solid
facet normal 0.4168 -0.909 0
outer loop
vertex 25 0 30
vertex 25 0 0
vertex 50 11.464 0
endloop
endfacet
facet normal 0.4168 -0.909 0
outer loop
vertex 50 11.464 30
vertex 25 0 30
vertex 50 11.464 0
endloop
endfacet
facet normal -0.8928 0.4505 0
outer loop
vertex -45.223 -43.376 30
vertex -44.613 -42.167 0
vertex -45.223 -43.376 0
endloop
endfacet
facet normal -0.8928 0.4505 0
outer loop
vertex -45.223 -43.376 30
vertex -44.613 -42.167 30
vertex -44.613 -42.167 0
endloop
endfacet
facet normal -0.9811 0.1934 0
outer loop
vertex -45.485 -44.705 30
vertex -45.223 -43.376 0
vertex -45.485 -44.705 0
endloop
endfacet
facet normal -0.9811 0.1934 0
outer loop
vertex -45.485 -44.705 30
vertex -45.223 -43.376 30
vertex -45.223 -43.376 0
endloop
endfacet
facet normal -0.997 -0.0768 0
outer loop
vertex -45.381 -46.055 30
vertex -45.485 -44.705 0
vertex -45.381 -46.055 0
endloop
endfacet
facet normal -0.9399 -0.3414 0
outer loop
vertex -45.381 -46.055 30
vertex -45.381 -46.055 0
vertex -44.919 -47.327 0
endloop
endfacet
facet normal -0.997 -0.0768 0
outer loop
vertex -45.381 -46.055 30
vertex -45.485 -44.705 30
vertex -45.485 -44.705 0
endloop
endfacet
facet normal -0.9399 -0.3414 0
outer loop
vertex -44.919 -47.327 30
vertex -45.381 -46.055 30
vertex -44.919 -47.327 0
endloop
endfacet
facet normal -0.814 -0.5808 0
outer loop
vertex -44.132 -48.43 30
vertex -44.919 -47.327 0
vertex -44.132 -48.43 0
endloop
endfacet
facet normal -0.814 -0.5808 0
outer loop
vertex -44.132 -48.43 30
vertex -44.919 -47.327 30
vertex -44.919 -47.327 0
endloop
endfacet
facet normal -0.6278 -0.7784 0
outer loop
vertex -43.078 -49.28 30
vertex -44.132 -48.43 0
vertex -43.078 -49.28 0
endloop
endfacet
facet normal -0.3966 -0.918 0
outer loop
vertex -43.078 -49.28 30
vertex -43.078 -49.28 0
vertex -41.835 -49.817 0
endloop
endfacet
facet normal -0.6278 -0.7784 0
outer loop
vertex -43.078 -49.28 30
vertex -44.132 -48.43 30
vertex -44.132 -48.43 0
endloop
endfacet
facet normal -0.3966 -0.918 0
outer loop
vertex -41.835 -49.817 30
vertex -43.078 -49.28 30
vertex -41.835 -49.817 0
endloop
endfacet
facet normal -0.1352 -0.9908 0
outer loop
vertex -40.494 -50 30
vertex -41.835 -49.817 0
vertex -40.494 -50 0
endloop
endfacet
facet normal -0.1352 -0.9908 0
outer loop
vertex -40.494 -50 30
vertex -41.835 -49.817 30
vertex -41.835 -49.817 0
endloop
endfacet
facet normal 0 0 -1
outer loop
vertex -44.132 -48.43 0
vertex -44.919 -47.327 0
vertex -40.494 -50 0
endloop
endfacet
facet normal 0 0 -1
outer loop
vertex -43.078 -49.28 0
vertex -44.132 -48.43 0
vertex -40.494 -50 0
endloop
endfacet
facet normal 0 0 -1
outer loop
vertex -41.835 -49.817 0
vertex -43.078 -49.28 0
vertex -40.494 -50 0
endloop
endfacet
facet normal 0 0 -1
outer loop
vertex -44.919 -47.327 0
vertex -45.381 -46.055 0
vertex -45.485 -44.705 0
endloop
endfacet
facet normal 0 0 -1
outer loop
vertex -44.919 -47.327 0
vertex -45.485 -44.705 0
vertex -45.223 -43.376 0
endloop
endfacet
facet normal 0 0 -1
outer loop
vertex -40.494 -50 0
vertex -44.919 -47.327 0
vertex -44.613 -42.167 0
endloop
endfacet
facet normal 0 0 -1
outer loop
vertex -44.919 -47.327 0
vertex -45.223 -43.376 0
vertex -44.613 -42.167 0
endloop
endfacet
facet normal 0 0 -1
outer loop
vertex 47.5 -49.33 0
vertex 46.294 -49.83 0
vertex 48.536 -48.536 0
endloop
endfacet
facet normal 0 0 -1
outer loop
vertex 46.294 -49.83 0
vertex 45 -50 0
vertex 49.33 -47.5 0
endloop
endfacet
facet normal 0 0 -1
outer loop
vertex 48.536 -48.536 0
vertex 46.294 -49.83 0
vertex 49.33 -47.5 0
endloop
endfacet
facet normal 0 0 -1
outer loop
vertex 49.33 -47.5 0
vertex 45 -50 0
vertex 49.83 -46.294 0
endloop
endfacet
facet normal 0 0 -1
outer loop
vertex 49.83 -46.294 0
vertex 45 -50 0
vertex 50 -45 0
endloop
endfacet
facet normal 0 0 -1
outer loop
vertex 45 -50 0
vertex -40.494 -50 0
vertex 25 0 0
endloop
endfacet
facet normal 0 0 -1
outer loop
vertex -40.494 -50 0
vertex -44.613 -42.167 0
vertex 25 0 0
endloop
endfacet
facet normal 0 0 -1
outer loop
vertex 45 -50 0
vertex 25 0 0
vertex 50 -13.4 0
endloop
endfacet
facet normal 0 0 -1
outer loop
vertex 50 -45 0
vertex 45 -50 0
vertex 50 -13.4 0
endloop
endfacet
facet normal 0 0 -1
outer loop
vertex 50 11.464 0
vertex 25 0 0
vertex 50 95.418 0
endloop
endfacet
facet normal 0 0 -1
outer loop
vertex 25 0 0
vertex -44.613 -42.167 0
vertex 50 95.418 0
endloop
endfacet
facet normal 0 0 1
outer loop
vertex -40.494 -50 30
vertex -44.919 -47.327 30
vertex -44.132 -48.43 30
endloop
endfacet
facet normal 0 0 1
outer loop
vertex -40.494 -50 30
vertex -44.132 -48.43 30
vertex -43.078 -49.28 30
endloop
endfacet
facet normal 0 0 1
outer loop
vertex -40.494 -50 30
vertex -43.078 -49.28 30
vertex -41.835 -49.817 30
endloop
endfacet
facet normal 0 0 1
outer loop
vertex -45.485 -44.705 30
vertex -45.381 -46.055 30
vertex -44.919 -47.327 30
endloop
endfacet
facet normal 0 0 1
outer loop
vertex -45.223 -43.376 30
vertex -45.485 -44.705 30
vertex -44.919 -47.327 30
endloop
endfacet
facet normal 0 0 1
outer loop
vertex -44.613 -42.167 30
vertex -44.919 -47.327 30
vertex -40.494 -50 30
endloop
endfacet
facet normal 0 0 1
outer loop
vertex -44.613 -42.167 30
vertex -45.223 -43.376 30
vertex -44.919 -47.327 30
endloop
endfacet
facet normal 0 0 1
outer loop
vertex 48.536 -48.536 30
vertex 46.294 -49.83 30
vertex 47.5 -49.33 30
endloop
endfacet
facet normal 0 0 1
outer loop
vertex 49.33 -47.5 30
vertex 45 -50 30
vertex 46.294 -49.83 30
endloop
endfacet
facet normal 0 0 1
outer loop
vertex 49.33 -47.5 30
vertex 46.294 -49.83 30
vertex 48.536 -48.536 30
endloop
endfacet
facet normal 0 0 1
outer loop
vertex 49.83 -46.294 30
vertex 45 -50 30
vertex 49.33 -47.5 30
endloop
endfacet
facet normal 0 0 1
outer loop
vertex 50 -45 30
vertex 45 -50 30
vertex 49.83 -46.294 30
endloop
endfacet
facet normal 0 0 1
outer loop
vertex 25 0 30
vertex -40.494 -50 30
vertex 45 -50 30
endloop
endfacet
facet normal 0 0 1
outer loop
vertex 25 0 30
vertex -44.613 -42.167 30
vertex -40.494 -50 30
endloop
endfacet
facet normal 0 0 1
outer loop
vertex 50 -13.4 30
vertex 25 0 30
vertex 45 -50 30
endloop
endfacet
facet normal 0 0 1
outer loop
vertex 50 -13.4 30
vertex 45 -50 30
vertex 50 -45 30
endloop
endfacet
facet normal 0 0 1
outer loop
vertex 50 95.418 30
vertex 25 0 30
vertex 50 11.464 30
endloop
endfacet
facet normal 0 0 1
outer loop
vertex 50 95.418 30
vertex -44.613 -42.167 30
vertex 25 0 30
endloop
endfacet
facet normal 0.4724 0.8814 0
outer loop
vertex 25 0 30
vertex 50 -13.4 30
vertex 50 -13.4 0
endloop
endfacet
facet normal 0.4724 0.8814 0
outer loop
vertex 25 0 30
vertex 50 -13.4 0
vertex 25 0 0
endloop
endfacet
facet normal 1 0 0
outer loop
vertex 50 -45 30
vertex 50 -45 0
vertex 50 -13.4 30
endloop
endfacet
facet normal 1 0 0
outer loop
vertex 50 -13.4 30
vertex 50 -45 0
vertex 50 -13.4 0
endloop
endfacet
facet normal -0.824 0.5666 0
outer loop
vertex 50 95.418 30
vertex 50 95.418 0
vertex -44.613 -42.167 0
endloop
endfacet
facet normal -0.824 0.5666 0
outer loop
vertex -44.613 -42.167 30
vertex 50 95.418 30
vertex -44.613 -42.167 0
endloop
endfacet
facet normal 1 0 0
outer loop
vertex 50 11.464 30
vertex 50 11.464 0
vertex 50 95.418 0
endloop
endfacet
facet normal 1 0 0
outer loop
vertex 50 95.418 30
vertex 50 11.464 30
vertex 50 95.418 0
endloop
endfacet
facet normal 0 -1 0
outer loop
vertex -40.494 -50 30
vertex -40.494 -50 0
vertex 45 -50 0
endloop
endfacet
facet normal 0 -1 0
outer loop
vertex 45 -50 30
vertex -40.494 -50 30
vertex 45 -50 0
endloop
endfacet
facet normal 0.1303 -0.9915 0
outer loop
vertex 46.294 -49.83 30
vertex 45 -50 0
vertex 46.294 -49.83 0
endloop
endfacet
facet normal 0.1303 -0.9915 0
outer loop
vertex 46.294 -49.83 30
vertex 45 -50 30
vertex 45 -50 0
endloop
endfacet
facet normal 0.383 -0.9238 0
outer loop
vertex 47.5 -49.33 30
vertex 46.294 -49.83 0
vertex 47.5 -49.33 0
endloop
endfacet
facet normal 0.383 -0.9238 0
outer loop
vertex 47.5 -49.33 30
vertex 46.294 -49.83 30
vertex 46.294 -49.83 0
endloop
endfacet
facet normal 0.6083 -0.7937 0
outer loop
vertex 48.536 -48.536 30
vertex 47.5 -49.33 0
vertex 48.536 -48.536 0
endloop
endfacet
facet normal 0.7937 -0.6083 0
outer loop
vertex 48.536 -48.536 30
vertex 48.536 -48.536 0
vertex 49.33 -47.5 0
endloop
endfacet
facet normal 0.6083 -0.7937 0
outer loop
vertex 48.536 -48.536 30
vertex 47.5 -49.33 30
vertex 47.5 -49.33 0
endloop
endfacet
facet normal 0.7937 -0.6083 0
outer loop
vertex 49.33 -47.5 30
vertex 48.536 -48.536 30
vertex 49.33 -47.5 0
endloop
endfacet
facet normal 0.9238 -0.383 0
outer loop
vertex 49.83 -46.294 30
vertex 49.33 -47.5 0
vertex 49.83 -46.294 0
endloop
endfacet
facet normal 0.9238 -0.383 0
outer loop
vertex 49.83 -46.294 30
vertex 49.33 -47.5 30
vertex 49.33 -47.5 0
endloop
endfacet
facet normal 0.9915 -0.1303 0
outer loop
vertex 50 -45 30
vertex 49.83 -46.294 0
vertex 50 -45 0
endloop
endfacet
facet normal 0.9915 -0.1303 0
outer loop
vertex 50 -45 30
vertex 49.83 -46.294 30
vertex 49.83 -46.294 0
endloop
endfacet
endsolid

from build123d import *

# Parameters (mm, degrees)
F1_DEPTH = 30
F2_R     = 5


with BuildPart() as f1:
    # F0 (on Top) → F1 (new body)
    with BuildSketch(Plane.XY):
        Polygon((50, 95.418446), (-50, -50), (50, -50), (50, -13.400296), (25, 0), (50, 11.463741), (50, 50), align=None)
    extrude(amount=F1_DEPTH)

    # F2
    f2_edges = [f1.edges().sort_by_distance(p)[0] for p in [
        (50, -50, 15),
        (-50, -50, 15),
    ]]
    fillet(f2_edges, radius=F2_R)


solid = f1.part
